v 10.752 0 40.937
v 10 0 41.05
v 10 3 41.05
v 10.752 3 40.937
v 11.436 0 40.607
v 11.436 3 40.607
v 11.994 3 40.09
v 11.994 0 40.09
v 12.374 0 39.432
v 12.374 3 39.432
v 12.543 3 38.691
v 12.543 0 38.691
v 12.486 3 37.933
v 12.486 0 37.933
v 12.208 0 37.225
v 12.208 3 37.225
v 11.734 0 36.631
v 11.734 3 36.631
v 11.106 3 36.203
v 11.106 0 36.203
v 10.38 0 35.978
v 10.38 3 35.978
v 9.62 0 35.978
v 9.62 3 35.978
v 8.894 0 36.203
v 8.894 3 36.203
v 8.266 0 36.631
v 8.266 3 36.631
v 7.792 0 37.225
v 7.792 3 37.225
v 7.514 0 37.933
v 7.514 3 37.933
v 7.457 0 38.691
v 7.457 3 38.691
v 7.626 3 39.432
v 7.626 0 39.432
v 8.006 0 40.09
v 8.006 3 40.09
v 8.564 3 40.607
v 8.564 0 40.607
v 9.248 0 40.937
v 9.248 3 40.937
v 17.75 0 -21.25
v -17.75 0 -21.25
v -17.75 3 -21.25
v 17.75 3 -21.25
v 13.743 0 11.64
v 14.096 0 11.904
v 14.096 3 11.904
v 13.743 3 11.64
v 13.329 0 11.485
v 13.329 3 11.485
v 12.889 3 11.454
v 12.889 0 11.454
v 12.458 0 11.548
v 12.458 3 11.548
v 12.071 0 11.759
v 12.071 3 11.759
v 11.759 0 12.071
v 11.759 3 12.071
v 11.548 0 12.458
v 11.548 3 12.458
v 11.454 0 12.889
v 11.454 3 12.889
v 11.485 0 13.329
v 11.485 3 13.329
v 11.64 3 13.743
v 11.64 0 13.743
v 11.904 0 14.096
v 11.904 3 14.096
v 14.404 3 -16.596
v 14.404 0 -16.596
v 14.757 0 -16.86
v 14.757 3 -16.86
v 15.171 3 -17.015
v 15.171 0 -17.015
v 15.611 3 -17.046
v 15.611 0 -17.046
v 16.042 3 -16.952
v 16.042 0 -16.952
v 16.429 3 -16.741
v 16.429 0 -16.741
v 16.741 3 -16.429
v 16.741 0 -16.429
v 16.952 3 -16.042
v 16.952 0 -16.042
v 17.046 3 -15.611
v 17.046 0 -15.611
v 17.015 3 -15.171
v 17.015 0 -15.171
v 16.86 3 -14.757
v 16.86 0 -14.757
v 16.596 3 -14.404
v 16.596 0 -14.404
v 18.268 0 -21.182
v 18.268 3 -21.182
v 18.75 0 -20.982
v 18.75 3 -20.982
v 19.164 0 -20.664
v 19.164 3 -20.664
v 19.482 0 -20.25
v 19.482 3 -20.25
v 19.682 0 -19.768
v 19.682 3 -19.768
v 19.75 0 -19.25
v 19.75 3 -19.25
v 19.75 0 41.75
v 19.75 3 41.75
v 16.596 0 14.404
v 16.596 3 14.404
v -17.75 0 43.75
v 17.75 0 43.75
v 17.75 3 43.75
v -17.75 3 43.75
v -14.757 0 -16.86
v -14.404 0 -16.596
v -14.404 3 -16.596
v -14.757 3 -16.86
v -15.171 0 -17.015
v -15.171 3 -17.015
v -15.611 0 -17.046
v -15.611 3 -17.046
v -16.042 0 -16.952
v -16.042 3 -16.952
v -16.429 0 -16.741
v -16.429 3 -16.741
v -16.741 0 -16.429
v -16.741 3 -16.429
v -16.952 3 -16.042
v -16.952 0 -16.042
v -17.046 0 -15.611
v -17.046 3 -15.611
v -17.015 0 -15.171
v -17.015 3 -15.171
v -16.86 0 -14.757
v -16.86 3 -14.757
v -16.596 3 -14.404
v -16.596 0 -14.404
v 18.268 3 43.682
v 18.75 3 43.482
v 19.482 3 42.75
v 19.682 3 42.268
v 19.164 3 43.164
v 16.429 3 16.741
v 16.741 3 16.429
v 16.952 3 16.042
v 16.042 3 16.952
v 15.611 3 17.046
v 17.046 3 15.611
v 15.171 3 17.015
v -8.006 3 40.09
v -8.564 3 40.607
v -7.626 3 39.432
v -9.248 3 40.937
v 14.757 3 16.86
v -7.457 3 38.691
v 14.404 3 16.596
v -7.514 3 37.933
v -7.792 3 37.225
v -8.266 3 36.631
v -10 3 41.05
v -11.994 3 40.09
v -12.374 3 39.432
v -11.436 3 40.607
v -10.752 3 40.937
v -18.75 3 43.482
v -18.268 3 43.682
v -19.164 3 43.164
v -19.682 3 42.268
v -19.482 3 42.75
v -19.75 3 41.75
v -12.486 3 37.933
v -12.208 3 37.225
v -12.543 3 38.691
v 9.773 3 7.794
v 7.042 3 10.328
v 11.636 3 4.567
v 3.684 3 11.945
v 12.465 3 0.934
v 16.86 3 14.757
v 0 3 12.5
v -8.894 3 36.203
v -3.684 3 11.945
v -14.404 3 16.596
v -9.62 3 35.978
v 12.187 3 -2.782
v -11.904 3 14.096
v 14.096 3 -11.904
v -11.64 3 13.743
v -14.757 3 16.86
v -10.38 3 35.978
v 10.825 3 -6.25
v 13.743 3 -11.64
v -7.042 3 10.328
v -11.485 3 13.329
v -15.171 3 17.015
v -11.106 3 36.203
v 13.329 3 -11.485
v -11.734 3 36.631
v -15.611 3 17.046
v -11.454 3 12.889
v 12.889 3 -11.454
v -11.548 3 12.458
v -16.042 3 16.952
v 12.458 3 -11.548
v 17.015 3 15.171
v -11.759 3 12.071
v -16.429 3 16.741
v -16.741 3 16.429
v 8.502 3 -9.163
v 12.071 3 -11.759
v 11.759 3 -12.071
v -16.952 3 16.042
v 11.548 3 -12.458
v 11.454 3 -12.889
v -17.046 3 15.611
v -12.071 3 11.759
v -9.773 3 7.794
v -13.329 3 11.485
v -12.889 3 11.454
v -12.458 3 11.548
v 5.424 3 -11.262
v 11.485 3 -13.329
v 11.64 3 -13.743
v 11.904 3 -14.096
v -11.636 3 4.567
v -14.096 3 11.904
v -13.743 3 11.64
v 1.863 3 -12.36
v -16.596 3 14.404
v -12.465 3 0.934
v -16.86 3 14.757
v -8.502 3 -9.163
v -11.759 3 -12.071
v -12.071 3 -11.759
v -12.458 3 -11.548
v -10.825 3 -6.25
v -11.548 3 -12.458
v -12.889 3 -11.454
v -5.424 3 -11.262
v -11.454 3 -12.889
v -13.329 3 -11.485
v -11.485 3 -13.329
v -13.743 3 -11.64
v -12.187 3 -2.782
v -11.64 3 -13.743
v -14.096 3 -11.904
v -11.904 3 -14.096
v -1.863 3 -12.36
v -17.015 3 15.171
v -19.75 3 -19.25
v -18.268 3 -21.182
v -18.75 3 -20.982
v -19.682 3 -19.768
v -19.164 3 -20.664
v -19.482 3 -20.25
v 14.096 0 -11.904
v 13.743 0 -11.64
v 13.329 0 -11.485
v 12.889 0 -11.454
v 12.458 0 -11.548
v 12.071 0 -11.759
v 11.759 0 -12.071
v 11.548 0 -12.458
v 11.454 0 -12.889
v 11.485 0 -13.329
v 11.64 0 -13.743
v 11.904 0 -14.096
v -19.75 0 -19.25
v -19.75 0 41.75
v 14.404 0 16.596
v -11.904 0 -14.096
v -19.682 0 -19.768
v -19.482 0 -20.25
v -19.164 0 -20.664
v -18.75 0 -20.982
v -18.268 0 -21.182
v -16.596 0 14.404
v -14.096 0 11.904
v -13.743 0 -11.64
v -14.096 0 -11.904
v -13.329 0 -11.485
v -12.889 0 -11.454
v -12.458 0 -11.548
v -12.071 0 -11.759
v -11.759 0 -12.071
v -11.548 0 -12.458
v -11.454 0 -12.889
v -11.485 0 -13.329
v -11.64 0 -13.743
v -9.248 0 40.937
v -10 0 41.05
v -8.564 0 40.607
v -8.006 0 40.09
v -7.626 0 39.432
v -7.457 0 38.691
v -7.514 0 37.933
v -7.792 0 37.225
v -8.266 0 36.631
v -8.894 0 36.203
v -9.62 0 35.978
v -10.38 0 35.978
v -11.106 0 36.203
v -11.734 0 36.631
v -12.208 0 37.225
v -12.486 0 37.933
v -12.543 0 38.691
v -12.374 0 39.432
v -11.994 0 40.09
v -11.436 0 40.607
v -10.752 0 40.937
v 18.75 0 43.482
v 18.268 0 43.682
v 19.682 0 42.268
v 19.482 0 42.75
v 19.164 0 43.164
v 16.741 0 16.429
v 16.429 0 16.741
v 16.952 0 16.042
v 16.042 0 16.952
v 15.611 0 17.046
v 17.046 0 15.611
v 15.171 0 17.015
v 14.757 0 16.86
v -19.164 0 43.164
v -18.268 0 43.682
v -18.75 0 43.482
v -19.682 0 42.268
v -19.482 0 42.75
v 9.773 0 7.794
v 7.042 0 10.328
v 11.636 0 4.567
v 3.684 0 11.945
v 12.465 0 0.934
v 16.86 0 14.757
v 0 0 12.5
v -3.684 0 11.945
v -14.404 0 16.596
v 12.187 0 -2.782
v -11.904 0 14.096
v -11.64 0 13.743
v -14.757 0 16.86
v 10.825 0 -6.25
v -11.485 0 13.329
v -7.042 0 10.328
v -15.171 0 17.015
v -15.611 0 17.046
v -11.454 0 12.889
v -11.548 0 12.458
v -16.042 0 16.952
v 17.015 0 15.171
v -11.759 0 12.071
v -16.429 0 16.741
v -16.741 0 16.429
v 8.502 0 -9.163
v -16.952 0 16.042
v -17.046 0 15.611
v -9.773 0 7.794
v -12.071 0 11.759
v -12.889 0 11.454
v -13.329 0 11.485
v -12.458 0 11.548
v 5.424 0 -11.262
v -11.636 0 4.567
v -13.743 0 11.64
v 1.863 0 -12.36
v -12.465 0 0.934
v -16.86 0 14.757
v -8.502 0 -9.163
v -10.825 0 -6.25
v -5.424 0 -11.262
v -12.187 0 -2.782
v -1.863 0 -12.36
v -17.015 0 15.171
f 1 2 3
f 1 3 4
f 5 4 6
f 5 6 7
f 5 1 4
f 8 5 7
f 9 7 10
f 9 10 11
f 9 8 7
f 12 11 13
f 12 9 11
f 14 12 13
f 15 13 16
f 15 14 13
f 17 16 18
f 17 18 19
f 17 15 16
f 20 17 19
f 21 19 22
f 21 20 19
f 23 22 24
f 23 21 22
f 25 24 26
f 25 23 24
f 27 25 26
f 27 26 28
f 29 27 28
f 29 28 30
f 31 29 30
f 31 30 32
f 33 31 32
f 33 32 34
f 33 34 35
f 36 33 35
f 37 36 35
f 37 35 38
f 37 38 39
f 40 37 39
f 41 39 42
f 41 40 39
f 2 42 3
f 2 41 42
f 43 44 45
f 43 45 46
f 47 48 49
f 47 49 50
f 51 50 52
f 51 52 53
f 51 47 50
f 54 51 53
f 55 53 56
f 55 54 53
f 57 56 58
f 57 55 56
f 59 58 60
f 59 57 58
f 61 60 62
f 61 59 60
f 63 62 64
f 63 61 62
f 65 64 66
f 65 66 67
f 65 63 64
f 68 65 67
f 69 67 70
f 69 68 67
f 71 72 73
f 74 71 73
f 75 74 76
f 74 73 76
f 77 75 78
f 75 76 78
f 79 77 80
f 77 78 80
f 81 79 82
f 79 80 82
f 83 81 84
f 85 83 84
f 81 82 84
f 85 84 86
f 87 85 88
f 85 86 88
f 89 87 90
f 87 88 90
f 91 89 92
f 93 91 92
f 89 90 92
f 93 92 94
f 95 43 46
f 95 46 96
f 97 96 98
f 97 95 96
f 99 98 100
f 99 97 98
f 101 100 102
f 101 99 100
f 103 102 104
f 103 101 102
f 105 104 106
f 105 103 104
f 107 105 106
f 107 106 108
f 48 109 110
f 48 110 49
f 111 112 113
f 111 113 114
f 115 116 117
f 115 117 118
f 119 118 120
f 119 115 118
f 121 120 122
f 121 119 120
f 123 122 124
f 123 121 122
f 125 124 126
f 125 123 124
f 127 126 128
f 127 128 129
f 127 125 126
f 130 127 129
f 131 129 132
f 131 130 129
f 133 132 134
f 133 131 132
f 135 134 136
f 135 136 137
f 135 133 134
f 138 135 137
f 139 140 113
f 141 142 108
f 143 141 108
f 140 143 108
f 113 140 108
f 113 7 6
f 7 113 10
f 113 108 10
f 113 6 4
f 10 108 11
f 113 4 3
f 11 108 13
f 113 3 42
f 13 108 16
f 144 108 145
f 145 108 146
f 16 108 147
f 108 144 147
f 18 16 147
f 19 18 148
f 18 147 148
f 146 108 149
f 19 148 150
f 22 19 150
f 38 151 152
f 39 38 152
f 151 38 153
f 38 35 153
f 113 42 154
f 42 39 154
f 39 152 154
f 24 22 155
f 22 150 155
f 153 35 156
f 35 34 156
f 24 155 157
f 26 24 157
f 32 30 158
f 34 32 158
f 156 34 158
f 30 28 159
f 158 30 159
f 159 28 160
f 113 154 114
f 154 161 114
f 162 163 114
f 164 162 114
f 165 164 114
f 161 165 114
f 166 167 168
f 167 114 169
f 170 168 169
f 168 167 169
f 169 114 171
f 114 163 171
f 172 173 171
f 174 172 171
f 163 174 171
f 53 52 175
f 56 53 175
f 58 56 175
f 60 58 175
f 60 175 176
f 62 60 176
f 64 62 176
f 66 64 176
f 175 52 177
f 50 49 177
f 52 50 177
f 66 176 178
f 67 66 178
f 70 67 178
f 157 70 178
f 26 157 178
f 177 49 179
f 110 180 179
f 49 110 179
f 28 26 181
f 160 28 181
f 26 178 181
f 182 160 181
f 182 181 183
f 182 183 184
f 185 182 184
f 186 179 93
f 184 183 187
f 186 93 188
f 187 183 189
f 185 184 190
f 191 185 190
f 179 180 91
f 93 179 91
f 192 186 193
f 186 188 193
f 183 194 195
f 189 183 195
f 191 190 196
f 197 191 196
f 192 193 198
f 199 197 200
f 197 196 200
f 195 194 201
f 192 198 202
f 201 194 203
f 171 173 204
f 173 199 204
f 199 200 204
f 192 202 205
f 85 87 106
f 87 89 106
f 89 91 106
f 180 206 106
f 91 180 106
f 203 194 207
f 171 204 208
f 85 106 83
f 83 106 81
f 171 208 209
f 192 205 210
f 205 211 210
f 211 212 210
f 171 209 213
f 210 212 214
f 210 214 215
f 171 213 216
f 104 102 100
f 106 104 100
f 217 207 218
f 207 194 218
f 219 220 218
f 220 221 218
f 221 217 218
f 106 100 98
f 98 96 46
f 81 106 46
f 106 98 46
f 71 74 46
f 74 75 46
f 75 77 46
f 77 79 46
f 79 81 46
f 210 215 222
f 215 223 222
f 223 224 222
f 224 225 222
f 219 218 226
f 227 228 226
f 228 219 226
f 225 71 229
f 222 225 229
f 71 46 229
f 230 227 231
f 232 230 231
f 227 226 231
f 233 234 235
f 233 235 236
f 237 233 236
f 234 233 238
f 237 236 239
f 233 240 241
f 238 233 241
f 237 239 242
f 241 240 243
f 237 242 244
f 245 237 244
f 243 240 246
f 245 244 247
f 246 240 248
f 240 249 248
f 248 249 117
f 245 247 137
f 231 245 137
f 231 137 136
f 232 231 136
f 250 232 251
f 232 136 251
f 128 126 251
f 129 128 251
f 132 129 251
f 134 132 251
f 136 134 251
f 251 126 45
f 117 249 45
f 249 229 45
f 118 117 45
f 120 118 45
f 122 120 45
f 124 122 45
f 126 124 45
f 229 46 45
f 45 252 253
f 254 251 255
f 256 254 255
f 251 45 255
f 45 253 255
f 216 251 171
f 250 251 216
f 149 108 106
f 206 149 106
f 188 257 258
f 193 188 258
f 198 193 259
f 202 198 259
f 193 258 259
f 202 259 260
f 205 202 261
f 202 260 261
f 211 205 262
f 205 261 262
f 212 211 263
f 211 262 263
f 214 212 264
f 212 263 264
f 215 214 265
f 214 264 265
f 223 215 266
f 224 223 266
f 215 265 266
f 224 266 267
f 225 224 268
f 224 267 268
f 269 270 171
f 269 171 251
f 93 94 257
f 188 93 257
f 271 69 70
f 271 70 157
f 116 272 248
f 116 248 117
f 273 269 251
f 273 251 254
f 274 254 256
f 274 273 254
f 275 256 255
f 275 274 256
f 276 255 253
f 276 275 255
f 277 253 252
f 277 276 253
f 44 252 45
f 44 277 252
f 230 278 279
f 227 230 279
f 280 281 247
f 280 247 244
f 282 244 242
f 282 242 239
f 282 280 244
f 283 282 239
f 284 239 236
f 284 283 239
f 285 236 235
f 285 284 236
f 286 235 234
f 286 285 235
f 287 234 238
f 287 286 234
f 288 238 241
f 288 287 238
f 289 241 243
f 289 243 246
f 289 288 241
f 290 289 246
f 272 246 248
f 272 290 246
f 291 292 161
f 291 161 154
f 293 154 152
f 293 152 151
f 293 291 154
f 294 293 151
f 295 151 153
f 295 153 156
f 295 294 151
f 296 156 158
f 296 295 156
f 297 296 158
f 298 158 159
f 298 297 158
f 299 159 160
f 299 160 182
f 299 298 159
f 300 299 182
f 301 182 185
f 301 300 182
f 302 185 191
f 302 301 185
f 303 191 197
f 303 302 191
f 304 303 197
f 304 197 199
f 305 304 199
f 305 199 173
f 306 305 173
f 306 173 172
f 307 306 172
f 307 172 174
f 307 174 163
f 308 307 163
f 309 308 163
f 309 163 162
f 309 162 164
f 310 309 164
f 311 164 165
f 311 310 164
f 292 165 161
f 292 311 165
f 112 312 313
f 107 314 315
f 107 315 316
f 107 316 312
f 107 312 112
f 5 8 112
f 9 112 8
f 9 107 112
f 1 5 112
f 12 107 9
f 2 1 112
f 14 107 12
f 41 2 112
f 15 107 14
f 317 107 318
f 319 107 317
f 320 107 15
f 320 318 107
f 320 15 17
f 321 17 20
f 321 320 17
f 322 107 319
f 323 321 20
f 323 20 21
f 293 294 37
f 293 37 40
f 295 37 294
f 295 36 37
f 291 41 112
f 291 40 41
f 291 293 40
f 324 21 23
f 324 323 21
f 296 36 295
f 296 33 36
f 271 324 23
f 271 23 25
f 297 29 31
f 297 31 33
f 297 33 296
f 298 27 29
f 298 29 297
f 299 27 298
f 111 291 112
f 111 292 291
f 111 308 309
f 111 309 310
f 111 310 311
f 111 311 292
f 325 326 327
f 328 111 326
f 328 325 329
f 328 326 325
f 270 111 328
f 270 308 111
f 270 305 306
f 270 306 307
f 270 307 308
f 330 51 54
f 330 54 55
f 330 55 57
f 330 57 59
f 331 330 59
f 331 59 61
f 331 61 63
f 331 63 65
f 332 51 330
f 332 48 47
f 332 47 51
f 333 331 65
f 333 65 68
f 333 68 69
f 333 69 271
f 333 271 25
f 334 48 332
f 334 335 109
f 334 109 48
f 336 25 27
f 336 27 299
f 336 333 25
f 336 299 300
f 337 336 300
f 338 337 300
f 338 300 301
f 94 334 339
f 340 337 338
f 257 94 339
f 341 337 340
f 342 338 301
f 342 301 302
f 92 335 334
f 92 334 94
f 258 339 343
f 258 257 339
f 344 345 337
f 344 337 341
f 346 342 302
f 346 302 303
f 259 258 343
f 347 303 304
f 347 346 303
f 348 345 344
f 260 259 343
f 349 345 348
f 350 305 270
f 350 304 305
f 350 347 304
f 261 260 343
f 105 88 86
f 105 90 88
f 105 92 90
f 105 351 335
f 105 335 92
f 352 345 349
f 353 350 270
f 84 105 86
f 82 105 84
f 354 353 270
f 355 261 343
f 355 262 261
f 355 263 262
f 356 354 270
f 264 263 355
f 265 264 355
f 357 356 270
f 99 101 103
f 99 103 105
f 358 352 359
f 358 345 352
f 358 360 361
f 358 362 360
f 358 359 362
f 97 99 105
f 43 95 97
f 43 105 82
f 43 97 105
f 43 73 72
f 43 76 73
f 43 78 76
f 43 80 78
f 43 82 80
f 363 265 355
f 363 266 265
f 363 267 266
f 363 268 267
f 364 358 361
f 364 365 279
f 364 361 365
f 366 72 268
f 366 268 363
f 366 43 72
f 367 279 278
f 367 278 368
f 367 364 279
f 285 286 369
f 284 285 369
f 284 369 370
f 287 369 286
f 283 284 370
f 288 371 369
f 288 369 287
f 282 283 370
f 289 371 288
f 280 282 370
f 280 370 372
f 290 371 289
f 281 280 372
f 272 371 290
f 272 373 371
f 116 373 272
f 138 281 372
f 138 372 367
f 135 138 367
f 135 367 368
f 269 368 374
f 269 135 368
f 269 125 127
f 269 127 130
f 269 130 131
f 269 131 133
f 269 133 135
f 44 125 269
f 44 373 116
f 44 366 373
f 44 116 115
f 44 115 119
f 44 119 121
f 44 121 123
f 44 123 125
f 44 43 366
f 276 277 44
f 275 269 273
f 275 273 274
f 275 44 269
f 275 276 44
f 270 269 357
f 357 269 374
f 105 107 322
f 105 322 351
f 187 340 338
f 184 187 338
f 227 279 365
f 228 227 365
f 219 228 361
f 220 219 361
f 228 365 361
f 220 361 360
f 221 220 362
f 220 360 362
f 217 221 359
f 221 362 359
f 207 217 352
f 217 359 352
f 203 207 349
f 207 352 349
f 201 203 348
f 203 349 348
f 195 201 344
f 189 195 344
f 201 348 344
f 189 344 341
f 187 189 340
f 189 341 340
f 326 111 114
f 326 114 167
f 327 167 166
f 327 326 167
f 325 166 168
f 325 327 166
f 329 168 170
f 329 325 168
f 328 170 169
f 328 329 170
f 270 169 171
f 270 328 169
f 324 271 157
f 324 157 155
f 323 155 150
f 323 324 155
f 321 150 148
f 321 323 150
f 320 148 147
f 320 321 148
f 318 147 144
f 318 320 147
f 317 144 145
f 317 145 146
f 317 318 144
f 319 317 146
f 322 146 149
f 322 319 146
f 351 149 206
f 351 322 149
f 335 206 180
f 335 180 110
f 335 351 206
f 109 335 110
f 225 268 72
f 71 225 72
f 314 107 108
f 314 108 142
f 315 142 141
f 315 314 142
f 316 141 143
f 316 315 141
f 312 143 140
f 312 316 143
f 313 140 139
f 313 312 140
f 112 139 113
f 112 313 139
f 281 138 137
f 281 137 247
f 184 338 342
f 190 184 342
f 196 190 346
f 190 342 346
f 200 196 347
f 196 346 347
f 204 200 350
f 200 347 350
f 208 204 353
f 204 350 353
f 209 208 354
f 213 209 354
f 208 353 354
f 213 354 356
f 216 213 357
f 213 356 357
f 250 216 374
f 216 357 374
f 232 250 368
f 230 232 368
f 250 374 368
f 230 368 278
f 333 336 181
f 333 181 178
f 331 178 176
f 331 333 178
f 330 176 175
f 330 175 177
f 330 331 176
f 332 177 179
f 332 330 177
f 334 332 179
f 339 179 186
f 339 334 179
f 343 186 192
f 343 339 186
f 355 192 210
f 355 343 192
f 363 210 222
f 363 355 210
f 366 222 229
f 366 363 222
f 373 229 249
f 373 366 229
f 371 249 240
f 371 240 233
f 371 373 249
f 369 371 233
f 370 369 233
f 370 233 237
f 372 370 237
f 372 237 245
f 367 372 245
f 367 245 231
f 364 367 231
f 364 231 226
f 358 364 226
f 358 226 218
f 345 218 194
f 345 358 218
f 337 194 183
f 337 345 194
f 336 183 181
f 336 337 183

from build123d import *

# Parameters (mm, degrees)
SKETCH1_R           = 12.5
SKETCH1_R_2         = 2.55
BOSS_EXTRUDE1_DEPTH = 3


with BuildPart() as part:
    # Sketch1 → Boss-Extrude1 (new body)
    with BuildSketch(Plane(origin=(0, 0, 0), x_dir=(1, 0, 0), z_dir=(0, 1, 0))):
        with BuildLine():
            Line((17.75, -43.75), (-17.75, -43.75))
            ThreePointArc((-17.75, -43.75), (-19.164213562, -43.164213562), (-19.75, -41.75))
            Line((-19.75, -41.75), (-19.75, 19.25))
            ThreePointArc((-19.75, 19.25), (-19.164213562, 20.664213562), (-17.75, 21.25))
            Line((-17.75, 21.25), (17.75, 21.25))
            ThreePointArc((17.75, 21.25), (19.164213562, 20.664213562), (19.75, 19.25))
            Line((19.75, 19.25), (19.75, -41.75))
            ThreePointArc((19.75, -41.75), (19.164213562, -43.164213562), (17.75, -43.75))
        make_face()
        with Locations(Location((0, 0, 0), (0, 0, 270))):
            Circle(SKETCH1_R, mode=Mode.SUBTRACT)
        with Locations(Location((10, -38.5, 0), (0, 0, 270))):
            Circle(SKETCH1_R_2, mode=Mode.SUBTRACT)
        with Locations(Location((-10, -38.5, 0), (0, 0, 270))):
            Circle(SKETCH1_R_2, mode=Mode.SUBTRACT)
        with BuildLine():
            Line((11.903984489, 14.096015511), (14.403984489, 16.596015511))
            ThreePointArc((14.403984489, 16.596015511), (16.596015511, 16.596015511), (16.596015511, 14.403984489))
            Line((16.596015511, 14.403984489), (14.096015511, 11.903984489))
            ThreePointArc((14.096015511, 11.903984489), (11.903984489, 11.903984489), (11.903984489, 14.096015511))
        make_face(mode=Mode.SUBTRACT)
        with BuildLine():
            Line((-11.903984489, 14.096015511), (-14.403984489, 16.596015511))
            ThreePointArc((-14.403984489, 16.596015511), (-16.596015511, 16.596015511), (-16.596015511, 14.403984489))
            Line((-16.596015511, 14.403984489), (-14.096015511, 11.903984489))
            ThreePointArc((-14.096015511, 11.903984489), (-11.903984489, 11.903984489), (-11.903984489, 14.096015511))
        make_face(mode=Mode.SUBTRACT)
        with BuildLine():
            Line((-11.903984489, -14.096015511), (-14.403984489, -16.596015511))
            ThreePointArc((-14.403984489, -16.596015511), (-16.596015511, -16.596015511), (-16.596015511, -14.403984489))
            Line((-16.596015511, -14.403984489), (-14.096015511, -11.903984489))
            ThreePointArc((-14.096015511, -11.903984489), (-11.903984489, -11.903984489), (-11.903984489, -14.096015511))
        make_face(mode=Mode.SUBTRACT)
        with BuildLine():
            Line((11.903984489, -14.096015511), (14.403984489, -16.596015511))
            ThreePointArc((14.403984489, -16.596015511), (16.596015511, -16.596015511), (16.596015511, -14.403984489))
            Line((16.596015511, -14.403984489), (14.096015511, -11.903984489))
            ThreePointArc((14.096015511, -11.903984489), (11.903984489, -11.903984489), (11.903984489, -14.096015511))
        make_face(mode=Mode.SUBTRACT)
    extrude(amount=BOSS_EXTRUDE1_DEPTH)


solid = part.part
